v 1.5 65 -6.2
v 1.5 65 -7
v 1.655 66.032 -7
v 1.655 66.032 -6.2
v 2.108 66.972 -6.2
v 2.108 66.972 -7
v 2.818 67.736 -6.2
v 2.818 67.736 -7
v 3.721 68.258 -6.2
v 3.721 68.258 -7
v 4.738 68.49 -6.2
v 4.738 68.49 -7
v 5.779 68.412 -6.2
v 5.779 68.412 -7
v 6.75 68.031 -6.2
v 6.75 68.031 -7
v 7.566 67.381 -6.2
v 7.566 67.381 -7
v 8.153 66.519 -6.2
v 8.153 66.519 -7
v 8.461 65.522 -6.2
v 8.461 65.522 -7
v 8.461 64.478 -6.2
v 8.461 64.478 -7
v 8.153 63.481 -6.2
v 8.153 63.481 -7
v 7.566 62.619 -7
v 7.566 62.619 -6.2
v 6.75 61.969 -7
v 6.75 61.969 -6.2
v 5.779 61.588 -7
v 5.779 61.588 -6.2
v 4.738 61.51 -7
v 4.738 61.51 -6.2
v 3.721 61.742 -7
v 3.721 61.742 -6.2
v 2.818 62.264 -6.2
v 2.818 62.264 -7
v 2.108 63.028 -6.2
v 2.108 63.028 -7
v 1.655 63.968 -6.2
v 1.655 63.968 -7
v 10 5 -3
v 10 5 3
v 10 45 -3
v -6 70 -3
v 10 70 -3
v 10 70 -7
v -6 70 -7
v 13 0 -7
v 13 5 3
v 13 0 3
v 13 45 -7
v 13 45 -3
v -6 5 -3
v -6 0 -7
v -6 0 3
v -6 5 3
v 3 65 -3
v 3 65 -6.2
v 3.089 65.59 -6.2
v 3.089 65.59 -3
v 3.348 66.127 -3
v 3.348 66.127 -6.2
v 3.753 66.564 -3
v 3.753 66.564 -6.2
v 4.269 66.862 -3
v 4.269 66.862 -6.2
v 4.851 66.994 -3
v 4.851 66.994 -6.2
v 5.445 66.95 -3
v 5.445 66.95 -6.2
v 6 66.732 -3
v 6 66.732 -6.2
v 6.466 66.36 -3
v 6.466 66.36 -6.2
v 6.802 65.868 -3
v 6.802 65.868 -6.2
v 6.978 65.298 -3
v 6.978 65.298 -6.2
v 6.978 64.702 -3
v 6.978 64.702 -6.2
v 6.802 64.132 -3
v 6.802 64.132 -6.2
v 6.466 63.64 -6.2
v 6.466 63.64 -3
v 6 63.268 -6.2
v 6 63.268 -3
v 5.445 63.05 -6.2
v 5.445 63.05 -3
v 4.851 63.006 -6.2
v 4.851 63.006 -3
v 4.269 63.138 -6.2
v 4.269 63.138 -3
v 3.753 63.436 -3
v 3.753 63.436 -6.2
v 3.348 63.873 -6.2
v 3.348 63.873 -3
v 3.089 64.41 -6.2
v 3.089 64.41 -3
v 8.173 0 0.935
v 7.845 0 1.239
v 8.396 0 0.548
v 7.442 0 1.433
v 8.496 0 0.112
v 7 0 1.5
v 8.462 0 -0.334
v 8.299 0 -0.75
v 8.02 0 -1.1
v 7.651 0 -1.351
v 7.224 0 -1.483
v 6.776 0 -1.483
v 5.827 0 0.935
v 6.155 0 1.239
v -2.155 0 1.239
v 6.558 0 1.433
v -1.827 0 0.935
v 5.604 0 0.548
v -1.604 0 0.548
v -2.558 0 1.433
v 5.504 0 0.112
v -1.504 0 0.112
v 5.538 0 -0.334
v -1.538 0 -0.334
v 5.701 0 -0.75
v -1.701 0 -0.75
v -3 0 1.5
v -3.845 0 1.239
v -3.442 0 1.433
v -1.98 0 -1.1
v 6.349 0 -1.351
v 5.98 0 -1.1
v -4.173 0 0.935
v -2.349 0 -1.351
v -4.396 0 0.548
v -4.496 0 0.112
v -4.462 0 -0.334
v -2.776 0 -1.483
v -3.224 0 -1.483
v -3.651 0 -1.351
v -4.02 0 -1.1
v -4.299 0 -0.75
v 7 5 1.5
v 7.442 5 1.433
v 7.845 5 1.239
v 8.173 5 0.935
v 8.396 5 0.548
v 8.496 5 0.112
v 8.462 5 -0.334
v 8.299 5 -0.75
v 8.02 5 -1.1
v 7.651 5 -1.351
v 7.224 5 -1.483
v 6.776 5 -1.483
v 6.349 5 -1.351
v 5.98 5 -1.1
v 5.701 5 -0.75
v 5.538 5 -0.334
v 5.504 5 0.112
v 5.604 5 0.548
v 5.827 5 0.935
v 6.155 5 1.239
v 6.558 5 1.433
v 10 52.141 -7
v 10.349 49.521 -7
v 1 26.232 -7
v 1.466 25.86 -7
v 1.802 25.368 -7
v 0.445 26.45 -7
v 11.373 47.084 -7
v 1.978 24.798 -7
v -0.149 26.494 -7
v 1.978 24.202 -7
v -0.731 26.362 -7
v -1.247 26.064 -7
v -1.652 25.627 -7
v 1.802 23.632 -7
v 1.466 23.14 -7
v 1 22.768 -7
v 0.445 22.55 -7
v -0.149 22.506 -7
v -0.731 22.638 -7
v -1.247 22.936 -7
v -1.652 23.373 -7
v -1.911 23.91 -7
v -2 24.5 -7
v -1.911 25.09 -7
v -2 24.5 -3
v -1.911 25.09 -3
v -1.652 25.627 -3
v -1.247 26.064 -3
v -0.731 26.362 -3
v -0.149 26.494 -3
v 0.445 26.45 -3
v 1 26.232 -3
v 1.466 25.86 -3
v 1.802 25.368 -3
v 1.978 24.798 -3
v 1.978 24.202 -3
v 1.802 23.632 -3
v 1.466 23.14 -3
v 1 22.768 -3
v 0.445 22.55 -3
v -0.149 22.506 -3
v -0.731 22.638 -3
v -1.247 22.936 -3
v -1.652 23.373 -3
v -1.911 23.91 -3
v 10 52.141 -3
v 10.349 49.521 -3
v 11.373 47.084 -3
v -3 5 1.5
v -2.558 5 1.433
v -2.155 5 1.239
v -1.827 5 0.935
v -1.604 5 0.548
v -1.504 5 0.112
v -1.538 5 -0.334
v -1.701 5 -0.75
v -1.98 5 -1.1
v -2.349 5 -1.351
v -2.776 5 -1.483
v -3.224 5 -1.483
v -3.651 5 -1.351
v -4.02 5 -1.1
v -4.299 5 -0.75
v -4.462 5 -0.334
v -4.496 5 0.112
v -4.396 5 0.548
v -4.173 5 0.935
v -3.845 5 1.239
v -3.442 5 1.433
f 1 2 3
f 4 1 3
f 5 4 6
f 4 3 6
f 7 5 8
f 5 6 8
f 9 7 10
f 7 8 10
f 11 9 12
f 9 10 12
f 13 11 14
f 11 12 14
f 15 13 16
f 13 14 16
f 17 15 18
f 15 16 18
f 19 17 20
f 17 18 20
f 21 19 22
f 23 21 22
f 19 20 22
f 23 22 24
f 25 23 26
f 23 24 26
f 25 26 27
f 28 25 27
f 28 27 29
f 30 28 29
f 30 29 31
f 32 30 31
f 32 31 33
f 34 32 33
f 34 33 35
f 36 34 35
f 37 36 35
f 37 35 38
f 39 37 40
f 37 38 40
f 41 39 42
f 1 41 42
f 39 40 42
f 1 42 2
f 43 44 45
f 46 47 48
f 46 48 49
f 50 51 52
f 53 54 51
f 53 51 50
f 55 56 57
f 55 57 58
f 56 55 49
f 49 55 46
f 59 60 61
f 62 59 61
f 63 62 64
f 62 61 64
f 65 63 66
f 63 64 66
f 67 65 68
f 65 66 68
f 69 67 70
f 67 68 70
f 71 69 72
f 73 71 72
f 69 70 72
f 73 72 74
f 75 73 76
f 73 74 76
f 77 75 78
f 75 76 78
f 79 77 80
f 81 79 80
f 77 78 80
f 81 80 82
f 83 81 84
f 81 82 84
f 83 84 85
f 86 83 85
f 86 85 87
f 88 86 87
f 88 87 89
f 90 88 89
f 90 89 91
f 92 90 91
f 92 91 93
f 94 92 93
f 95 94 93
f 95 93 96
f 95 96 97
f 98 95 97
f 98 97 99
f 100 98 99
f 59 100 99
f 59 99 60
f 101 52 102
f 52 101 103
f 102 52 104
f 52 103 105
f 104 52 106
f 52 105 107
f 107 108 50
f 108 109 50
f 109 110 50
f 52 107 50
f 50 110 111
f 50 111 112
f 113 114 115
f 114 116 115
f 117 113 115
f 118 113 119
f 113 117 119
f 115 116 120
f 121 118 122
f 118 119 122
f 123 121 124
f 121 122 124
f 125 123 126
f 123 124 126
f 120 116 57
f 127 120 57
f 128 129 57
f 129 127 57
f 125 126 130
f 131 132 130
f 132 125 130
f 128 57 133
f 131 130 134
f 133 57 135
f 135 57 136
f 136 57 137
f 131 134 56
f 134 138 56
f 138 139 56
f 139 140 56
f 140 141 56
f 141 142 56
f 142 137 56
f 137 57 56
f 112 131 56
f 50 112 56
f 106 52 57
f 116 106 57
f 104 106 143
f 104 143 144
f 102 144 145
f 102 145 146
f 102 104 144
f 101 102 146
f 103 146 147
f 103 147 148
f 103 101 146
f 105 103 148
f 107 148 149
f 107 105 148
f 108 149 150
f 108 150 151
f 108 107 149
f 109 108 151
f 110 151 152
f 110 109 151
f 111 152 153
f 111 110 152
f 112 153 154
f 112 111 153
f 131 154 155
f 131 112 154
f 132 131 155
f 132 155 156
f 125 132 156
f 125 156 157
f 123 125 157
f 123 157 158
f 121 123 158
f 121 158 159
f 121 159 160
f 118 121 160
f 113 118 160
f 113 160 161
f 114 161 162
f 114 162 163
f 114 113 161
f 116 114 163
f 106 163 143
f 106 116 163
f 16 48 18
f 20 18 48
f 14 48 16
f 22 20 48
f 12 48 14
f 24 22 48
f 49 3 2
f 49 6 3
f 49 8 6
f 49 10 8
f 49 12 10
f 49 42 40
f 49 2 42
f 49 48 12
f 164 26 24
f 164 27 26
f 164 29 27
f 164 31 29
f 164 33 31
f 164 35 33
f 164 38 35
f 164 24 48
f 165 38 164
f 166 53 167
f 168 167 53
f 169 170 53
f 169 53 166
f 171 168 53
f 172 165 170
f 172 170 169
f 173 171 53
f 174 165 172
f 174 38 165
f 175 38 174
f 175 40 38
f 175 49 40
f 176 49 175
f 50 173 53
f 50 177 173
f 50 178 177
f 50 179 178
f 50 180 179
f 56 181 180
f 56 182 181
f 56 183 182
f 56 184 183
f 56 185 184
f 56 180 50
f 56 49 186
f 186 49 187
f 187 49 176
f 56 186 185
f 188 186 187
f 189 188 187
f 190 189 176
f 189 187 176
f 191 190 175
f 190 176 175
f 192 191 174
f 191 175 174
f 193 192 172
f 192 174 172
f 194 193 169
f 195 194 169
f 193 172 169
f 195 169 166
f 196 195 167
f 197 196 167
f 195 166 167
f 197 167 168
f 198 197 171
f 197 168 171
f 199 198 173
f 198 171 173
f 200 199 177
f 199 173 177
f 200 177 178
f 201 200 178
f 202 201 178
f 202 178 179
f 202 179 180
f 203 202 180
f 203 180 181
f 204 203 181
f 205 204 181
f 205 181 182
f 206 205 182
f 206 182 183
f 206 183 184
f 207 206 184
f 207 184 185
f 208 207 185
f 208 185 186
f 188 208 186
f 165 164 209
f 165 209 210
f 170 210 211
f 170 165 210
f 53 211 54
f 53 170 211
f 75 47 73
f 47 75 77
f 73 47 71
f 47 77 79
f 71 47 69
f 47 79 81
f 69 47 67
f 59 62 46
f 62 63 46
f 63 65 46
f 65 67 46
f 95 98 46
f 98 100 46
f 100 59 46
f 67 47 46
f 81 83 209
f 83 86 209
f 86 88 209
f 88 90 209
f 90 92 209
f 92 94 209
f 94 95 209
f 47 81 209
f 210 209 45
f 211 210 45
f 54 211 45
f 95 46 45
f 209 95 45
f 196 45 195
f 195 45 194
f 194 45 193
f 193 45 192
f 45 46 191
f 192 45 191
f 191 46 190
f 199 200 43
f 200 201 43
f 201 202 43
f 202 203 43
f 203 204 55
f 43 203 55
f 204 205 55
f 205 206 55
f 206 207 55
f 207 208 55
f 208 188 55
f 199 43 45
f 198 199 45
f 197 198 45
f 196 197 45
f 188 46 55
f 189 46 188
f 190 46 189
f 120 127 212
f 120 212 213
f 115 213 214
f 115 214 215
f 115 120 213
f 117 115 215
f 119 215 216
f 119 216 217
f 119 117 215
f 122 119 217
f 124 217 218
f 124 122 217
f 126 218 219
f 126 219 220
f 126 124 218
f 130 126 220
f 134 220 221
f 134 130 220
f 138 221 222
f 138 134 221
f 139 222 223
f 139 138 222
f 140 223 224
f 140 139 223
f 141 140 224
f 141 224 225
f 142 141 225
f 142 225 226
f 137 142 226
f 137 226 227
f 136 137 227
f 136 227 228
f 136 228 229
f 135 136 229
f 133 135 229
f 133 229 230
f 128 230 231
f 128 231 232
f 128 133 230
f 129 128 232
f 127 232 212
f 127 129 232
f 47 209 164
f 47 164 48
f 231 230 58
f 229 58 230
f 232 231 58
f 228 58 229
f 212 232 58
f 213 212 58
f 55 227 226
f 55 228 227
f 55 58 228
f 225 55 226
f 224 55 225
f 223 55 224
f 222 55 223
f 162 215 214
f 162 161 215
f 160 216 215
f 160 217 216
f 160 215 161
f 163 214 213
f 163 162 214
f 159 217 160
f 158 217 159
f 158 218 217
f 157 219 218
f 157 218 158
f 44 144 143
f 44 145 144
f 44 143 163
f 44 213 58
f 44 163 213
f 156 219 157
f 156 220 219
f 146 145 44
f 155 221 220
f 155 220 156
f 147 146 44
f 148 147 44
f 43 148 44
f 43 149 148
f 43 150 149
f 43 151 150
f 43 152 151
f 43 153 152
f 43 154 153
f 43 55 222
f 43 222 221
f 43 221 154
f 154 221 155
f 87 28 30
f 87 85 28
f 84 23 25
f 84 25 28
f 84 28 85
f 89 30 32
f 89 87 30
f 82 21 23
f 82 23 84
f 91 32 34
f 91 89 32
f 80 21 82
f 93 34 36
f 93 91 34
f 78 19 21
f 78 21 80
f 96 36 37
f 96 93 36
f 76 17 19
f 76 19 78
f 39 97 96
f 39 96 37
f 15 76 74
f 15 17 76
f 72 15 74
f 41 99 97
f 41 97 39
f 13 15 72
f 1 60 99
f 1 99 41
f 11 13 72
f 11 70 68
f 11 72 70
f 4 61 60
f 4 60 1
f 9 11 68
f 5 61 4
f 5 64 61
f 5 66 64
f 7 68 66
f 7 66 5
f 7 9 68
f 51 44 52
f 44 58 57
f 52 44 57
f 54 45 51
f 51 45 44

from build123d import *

# Parameters (mm, degrees)
SKETCH_1_W          = 16
SKETCH_1_H          = 6
SKETCH_1_R          = 1.5
EXTRUDE_1_DEPTH     = 5
SKETCH_2_W          = 16
SKETCH_2_H          = 70
EXTRUDE_2_DEPTH     = 4
SKETCH_3_R          = 2
CUT_EXTRUDE_1_DEPTH = 72.414284285
SKETCH_4_R          = 2
CUT_EXTRUDE_2_DEPTH = 72.414284285
SKETCH_5_R          = 3.5
CUT_EXTRUDE_3_DEPTH = 0.8
EXTRUDE_3_DEPTH     = 3
FILLET_1_R          = 10


with BuildPart() as part:
    # 草图1 → 凸台-拉伸1 (new body)
    with BuildSketch(Plane(origin=(0, 0, 0), x_dir=(1, 0, 0), z_dir=(0, 1, 0))):
        with Locations((2, 0)):
            Rectangle(SKETCH_1_W, SKETCH_1_H)
        with Locations(Location((-3, 0, 0), (0, 0, 270))):
            Circle(SKETCH_1_R, mode=Mode.SUBTRACT)
        with Locations(Location((7, 0, 0), (0, 0, 270))):
            Circle(SKETCH_1_R, mode=Mode.SUBTRACT)
    extrude(amount=EXTRUDE_1_DEPTH)

    # 草图2 → 凸台-拉伸2 (add)
    with BuildSketch(Plane(origin=(0, 0, -3), x_dir=(-1, 0, 0), z_dir=(0, 0, -1))):
        with Locations((-2, 35)):
            Rectangle(SKETCH_2_W, SKETCH_2_H)
    extrude(amount=EXTRUDE_2_DEPTH)

    # 草图3 → 切除-拉伸1 (cut, through all)
    with BuildSketch(Plane(origin=(0, 0, -7), x_dir=(-1, 0, 0), z_dir=(0, 0, -1))):
        with Locations((-5, 65)):
            Circle(SKETCH_3_R)
    extrude(amount=-CUT_EXTRUDE_1_DEPTH, mode=Mode.SUBTRACT)

    # 草图4 → 切除-拉伸2 (cut, through all)
    with BuildSketch(Plane(origin=(0, 0, -7), x_dir=(-1, 0, 0), z_dir=(0, 0, -1))):
        with Locations((0, 24.5)):
            Circle(SKETCH_4_R)
    extrude(amount=-CUT_EXTRUDE_2_DEPTH, mode=Mode.SUBTRACT)

    # 草图5 → 切除-拉伸3 (cut)
    with BuildSketch(Plane(origin=(0, 0, -7), x_dir=(-1, 0, 0), z_dir=(0, 0, -1))):
        with Locations((-5, 65)):
            Circle(SKETCH_5_R)
    extrude(amount=-CUT_EXTRUDE_3_DEPTH, mode=Mode.SUBTRACT)

    # 草图6 → 凸台-拉伸3 (add)
    with BuildSketch(Plane(origin=(10, 0, 0), x_dir=(0, 0, -1), z_dir=(1, 0, 0))):
        Polygon((3, 5), (-3, 5), (-3, 0), (7, 0), (7, 45), (3, 45), align=None)
        Polygon((3, 45), (-3, 5), (3, 5), align=None)
    extrude(amount=EXTRUDE_3_DEPTH)

    # 圆角1
    # the kernel refuses this fillet: 10 mm, written as the material it adds along each edge
    with BuildSketch(Plane(origin=(10, 45, -7), x_dir=(0, 1, 0), z_dir=(0, 0, 1))) as fillet_1_piece_1:
        with BuildLine():
            CenterArc((7.141428429, -10), FILLET_1_R, 90, 45.572995999)
            Line((0, -3), (0, 0))
            Line((0, 0), (7.141428429, 0))
        make_face()
    extrude(amount=4)


solid = part.part
